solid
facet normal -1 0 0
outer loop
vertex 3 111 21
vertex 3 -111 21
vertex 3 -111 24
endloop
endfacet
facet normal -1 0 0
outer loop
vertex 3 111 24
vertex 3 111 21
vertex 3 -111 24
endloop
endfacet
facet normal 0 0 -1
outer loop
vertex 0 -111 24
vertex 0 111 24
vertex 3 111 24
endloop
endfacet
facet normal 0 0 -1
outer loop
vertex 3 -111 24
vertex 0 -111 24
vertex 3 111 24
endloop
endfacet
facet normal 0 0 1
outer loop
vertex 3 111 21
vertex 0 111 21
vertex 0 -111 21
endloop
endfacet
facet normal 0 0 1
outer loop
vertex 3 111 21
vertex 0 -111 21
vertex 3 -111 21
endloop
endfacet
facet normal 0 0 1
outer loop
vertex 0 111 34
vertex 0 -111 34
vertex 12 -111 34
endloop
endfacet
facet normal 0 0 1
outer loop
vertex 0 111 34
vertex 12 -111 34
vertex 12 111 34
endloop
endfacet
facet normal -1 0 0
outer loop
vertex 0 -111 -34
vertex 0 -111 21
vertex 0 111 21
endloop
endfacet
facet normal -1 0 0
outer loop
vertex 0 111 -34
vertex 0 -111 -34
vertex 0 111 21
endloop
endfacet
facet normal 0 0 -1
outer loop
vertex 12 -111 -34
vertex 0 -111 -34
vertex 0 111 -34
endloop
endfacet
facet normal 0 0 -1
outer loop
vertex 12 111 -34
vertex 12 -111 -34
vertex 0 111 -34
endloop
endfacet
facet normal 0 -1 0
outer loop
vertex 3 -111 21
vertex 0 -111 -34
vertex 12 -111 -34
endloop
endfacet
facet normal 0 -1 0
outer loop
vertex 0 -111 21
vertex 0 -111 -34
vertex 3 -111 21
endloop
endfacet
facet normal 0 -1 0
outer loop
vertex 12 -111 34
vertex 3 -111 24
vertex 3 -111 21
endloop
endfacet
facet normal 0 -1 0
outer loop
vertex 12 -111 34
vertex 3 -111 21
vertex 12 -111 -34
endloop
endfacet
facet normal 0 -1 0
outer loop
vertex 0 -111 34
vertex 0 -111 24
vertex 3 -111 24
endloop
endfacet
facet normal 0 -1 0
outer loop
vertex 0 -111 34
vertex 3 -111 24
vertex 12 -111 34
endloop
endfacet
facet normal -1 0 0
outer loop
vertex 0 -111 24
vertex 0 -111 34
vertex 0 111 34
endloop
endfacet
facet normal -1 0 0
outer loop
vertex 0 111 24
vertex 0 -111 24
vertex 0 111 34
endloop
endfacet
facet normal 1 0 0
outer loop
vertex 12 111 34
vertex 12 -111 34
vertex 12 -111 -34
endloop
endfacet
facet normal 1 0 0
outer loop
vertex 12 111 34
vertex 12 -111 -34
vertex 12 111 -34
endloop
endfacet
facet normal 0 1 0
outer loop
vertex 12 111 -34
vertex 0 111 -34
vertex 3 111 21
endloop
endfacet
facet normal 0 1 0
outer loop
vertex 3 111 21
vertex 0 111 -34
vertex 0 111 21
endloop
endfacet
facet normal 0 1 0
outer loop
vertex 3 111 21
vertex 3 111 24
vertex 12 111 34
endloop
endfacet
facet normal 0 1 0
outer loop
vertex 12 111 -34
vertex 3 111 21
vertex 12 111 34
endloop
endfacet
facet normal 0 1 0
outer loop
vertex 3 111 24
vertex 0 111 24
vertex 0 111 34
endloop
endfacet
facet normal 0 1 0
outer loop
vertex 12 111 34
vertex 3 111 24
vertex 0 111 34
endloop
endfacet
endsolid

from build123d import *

# Parameters (mm, degrees)
F0_W     = 222
F0_H     = 68
F1_DEPTH = 12
F2_W     = 3
F2_H     = 3
F3_DEPTH = 300


with BuildPart() as f1:
    # F0 (on Right) → F1 (new body)
    with BuildSketch(Plane.YZ):
        Rectangle(F0_W, F0_H)
    extrude(amount=F1_DEPTH)

    # F2 (on face) → F3 (cut)
    with BuildSketch(Plane.XZ.offset(111)):
        with Locations((1.5, 22.5)):
            Rectangle(F2_W, F2_H)
    extrude(amount=-F3_DEPTH, mode=Mode.SUBTRACT)


solid = f1.part
